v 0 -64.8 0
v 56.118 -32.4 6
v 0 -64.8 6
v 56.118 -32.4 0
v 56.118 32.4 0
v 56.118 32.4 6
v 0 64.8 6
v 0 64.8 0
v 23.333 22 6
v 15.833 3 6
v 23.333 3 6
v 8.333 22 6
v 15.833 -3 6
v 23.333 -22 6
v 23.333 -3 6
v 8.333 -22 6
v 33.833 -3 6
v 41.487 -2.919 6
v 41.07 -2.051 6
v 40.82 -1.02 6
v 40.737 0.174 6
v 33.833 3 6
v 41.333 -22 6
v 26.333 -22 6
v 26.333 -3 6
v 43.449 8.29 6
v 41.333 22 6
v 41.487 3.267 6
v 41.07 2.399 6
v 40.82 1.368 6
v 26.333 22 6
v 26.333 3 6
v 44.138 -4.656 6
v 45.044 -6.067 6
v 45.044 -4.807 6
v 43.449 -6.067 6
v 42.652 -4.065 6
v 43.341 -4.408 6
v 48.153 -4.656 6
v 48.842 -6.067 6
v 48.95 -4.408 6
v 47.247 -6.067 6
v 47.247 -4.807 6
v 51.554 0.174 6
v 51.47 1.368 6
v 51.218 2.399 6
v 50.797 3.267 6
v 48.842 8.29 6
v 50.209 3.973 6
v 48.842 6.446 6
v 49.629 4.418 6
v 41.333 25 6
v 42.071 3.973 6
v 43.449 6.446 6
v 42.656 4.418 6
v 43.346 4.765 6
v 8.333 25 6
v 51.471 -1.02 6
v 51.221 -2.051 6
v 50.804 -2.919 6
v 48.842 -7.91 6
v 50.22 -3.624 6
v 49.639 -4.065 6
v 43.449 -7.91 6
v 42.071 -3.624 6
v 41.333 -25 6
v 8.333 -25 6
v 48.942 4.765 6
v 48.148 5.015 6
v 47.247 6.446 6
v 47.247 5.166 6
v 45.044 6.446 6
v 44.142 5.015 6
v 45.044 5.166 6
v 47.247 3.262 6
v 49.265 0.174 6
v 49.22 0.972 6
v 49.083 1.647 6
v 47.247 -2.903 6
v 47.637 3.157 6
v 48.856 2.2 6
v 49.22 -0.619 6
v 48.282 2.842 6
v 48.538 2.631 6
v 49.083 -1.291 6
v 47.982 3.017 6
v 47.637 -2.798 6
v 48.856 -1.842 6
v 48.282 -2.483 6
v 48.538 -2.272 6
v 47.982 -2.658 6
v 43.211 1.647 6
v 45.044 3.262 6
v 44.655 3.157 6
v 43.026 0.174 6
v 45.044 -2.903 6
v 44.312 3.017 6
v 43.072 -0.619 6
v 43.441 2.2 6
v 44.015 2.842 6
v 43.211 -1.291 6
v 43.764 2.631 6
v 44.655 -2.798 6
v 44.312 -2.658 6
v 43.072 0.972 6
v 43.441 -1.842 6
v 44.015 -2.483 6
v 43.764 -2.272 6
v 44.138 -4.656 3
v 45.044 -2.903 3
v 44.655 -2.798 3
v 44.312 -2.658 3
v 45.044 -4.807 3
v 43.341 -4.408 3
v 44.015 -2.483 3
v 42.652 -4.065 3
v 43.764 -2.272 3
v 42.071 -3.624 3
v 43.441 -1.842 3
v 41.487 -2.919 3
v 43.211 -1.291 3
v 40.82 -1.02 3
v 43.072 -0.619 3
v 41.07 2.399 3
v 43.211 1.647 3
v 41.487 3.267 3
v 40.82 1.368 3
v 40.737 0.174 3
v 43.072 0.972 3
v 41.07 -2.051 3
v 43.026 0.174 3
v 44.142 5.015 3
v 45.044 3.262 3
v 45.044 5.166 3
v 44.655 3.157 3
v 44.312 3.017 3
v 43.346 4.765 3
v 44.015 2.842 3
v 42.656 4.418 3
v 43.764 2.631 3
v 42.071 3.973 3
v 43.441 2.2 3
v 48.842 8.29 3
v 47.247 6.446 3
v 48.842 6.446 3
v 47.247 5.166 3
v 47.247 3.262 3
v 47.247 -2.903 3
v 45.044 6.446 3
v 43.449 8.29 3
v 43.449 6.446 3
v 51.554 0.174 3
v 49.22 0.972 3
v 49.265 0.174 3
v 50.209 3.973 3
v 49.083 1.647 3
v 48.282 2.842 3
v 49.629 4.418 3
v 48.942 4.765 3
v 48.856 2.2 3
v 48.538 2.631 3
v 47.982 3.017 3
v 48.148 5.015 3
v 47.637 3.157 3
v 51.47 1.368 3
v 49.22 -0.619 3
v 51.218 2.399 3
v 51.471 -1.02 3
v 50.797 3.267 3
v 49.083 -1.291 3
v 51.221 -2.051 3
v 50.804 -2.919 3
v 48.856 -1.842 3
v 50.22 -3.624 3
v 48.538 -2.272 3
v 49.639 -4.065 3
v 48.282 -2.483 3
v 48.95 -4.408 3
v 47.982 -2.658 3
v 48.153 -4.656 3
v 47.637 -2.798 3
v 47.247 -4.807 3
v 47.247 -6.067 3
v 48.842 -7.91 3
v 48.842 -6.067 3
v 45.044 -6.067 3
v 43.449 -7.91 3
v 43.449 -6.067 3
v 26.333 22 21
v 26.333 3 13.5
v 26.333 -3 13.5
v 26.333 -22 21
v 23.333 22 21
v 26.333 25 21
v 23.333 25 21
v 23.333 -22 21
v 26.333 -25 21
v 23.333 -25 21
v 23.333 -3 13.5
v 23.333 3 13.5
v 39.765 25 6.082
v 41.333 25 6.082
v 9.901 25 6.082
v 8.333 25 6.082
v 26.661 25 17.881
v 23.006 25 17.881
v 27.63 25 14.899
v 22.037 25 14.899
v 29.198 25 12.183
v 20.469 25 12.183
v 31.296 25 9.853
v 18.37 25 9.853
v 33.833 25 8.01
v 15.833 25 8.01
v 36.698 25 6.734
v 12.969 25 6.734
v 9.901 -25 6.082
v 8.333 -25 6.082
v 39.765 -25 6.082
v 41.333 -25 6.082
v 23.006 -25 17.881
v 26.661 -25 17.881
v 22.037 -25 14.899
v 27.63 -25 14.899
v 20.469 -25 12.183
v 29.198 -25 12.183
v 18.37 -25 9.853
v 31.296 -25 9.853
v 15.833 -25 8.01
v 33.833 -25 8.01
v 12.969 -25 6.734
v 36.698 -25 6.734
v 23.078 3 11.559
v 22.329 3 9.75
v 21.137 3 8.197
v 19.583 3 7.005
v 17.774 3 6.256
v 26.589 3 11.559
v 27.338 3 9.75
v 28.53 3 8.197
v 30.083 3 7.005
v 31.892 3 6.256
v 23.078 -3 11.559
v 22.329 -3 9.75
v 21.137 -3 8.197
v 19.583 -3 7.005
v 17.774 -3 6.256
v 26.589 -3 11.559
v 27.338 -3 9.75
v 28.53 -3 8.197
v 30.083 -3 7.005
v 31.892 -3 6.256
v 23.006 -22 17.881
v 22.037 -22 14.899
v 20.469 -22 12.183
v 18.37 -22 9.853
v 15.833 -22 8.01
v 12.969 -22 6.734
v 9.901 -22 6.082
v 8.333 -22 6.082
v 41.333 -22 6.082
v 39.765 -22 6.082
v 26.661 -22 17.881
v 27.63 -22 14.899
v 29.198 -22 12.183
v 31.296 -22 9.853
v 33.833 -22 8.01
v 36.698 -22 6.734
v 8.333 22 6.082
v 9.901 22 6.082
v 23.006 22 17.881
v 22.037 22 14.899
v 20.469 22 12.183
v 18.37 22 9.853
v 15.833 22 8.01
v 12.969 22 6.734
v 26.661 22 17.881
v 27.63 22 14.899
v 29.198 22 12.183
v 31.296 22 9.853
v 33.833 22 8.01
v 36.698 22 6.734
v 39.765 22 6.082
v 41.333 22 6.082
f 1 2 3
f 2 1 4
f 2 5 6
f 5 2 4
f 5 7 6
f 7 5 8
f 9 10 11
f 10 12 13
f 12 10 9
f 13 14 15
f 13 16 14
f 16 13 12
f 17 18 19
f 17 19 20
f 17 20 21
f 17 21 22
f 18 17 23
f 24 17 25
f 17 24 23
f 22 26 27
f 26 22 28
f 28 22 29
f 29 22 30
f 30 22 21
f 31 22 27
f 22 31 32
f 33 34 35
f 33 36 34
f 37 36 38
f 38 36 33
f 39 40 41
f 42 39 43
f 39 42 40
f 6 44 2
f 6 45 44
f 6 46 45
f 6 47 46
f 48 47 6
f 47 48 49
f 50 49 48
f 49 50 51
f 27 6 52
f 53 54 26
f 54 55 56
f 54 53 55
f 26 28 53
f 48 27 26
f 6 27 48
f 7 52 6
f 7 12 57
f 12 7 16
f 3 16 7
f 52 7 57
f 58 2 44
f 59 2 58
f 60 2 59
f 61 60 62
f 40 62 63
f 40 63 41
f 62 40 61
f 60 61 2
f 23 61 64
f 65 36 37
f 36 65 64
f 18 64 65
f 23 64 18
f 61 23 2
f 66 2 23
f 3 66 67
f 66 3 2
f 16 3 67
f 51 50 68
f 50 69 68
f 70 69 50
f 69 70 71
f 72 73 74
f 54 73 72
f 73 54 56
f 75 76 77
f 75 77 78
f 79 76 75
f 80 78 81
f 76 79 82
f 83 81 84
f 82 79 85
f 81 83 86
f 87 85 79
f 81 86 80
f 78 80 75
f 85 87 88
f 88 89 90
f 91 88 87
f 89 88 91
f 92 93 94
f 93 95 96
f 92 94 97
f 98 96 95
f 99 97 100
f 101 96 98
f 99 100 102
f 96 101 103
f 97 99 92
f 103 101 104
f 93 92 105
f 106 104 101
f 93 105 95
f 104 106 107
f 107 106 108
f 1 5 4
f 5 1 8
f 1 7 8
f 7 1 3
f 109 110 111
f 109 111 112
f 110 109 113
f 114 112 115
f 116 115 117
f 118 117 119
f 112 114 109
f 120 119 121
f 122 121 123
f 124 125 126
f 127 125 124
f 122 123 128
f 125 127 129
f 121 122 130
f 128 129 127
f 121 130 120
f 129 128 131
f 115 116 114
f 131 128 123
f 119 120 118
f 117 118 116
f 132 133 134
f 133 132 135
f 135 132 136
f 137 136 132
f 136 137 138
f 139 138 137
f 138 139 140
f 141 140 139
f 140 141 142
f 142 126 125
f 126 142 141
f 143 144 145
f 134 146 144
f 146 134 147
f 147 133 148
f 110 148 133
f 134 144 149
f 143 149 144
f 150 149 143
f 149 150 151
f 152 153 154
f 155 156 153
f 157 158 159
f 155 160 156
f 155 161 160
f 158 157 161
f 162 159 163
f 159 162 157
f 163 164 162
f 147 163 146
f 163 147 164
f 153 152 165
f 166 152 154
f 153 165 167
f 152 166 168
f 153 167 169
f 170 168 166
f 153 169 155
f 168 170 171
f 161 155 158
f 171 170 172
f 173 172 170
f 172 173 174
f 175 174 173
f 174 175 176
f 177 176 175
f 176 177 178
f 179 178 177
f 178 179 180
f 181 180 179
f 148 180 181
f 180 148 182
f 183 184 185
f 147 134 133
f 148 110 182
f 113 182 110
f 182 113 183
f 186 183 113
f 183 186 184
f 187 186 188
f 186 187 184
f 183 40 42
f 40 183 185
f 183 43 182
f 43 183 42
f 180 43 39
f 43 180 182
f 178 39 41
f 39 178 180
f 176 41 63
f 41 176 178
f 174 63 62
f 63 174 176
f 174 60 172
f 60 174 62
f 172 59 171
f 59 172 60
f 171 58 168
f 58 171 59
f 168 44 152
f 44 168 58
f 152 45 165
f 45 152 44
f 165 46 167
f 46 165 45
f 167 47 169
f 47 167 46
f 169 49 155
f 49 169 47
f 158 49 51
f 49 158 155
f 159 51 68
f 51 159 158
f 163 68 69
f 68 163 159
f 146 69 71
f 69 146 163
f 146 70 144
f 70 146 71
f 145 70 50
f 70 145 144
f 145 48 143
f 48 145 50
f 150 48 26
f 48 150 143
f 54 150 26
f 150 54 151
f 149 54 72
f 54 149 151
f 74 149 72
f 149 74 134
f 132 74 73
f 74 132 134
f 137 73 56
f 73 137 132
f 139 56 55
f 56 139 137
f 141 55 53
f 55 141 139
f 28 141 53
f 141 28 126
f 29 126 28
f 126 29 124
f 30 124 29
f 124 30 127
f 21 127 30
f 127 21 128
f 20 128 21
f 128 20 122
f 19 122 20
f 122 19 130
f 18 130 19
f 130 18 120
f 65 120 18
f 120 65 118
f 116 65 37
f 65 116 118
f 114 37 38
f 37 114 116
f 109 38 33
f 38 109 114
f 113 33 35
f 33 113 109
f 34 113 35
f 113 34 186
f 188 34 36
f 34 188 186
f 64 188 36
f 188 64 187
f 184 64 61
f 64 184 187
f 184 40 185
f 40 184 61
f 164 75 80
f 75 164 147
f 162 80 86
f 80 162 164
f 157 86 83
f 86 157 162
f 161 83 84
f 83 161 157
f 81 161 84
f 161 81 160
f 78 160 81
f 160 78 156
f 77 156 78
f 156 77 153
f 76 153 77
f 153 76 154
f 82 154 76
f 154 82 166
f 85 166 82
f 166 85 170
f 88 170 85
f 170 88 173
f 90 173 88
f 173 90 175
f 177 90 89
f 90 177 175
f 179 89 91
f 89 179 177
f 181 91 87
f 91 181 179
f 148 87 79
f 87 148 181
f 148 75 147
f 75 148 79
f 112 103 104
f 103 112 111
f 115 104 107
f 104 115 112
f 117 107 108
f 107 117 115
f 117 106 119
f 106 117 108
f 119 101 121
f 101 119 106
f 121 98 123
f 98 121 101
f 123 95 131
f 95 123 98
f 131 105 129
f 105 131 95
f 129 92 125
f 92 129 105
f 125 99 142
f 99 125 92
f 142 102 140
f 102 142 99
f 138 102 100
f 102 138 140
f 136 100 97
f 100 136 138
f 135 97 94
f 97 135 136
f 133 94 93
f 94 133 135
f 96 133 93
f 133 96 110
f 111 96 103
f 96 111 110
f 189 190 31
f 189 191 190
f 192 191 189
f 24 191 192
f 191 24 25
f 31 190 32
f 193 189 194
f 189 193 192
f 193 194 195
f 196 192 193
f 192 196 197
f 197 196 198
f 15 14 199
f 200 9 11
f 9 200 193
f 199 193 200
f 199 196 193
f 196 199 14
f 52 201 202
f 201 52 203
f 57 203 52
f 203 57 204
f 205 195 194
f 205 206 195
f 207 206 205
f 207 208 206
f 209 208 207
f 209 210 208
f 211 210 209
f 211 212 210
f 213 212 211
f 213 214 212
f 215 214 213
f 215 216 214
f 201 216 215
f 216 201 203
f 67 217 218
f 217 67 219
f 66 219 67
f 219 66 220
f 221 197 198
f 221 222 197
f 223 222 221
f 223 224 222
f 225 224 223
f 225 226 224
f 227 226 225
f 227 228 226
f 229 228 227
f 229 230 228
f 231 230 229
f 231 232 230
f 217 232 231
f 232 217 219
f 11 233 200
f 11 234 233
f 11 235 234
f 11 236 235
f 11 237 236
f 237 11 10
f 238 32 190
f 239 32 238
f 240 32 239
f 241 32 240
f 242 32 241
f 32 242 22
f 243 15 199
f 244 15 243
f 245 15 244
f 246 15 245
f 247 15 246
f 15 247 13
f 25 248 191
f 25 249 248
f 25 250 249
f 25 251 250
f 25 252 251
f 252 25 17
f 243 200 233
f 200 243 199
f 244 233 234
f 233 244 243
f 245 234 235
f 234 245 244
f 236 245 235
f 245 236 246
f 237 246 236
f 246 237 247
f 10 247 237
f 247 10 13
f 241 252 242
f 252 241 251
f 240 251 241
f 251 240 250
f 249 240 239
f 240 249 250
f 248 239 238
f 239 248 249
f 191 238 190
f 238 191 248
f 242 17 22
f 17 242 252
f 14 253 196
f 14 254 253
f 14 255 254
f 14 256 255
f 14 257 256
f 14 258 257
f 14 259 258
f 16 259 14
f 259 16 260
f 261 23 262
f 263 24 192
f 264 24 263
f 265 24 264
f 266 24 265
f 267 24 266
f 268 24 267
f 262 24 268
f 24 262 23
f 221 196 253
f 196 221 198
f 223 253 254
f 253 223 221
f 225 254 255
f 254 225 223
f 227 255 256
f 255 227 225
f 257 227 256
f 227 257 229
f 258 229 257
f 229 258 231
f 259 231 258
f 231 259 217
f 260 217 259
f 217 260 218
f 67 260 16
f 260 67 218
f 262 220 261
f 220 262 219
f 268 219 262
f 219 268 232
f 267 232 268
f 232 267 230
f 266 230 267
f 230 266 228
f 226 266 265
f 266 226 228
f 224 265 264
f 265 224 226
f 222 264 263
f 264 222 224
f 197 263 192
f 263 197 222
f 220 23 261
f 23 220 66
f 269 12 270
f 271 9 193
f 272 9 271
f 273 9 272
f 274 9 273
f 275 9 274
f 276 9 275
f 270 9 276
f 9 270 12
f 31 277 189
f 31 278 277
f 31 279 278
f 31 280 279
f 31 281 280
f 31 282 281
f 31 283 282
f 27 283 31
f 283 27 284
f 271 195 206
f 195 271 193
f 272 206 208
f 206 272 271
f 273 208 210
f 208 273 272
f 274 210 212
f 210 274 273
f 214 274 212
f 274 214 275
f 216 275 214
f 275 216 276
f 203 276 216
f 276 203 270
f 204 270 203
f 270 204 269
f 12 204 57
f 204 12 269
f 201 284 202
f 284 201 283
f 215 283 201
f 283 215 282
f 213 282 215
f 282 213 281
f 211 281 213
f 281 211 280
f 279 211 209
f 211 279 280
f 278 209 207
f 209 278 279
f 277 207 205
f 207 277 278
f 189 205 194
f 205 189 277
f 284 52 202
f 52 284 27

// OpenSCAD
// file: ../../../assets/components/chamfer.scad
module chamfer(r) {
    difference() {
        square(r);
        translate([r,r]) 
        circle(r);
    }
}

chamfer(r = 5);
// file: ../../../assets/components/hexagon.scad
// Base shape
module Hexagon(r, height){
    rotate([0,0,30])
    cylinder($fn=6, r=r, h=height);
}
// main file
radius=70;
digit_relief=3;
frame_height=6;
frame_width=5;

symbol = "Φ";
symbol_size = 16;

handle_length = 50;
handle_height = 15;
handle_thickness = 3;

use <../../../assets/components/hexagon.scad>
use <../../../assets/components/chamfer.scad>

difference() {
    #difference() {
        Hexagon(r = radius - frame_width - 0.2, height = frame_height);

        translate([-radius,-radius,0]) 
        cube([radius, radius * 2, frame_height + 0.1]);
    }
    translate([46,0, frame_height - digit_relief])
    linear_extrude(height = digit_relief) 
    text(text = symbol, size = symbol_size, font="mono", valign="center", halign="center");

}

translate([radius / 3, -(handle_length / 2), frame_height]) {
    cube([handle_thickness, handle_length, handle_height]);

    translate([handle_thickness / 2, handle_thickness +  handle_length / 2,0])
    rotate(90, [1,0,0])
    linear_extrude(handle_thickness * 2) {
        mirror([1,0,0])
        translate([handle_thickness / 2,0,0]) 
        chamfer(handle_height / 2);
        translate([handle_thickness / 2,0,0]) 
        chamfer(handle_height / 2);
    }

    translate([handle_thickness / 2,handle_thickness,0])
    rotate(90, [1,0,0])
    linear_extrude(handle_thickness) {
        mirror([1,0,0])
        translate([handle_thickness / 2,0,0]) 
        chamfer(handle_height);
        translate([handle_thickness / 2,0,0]) 
        chamfer(handle_height);
    }

    translate([handle_thickness / 2 ,handle_length,0])
    rotate(90, [1,0,0])
    linear_extrude(handle_thickness) {
        mirror([1,0,0])
        translate([handle_thickness / 2,0,0]) 
        chamfer(handle_height);
        translate([handle_thickness / 2,0,0]) 
        chamfer(handle_height);
    }
}
